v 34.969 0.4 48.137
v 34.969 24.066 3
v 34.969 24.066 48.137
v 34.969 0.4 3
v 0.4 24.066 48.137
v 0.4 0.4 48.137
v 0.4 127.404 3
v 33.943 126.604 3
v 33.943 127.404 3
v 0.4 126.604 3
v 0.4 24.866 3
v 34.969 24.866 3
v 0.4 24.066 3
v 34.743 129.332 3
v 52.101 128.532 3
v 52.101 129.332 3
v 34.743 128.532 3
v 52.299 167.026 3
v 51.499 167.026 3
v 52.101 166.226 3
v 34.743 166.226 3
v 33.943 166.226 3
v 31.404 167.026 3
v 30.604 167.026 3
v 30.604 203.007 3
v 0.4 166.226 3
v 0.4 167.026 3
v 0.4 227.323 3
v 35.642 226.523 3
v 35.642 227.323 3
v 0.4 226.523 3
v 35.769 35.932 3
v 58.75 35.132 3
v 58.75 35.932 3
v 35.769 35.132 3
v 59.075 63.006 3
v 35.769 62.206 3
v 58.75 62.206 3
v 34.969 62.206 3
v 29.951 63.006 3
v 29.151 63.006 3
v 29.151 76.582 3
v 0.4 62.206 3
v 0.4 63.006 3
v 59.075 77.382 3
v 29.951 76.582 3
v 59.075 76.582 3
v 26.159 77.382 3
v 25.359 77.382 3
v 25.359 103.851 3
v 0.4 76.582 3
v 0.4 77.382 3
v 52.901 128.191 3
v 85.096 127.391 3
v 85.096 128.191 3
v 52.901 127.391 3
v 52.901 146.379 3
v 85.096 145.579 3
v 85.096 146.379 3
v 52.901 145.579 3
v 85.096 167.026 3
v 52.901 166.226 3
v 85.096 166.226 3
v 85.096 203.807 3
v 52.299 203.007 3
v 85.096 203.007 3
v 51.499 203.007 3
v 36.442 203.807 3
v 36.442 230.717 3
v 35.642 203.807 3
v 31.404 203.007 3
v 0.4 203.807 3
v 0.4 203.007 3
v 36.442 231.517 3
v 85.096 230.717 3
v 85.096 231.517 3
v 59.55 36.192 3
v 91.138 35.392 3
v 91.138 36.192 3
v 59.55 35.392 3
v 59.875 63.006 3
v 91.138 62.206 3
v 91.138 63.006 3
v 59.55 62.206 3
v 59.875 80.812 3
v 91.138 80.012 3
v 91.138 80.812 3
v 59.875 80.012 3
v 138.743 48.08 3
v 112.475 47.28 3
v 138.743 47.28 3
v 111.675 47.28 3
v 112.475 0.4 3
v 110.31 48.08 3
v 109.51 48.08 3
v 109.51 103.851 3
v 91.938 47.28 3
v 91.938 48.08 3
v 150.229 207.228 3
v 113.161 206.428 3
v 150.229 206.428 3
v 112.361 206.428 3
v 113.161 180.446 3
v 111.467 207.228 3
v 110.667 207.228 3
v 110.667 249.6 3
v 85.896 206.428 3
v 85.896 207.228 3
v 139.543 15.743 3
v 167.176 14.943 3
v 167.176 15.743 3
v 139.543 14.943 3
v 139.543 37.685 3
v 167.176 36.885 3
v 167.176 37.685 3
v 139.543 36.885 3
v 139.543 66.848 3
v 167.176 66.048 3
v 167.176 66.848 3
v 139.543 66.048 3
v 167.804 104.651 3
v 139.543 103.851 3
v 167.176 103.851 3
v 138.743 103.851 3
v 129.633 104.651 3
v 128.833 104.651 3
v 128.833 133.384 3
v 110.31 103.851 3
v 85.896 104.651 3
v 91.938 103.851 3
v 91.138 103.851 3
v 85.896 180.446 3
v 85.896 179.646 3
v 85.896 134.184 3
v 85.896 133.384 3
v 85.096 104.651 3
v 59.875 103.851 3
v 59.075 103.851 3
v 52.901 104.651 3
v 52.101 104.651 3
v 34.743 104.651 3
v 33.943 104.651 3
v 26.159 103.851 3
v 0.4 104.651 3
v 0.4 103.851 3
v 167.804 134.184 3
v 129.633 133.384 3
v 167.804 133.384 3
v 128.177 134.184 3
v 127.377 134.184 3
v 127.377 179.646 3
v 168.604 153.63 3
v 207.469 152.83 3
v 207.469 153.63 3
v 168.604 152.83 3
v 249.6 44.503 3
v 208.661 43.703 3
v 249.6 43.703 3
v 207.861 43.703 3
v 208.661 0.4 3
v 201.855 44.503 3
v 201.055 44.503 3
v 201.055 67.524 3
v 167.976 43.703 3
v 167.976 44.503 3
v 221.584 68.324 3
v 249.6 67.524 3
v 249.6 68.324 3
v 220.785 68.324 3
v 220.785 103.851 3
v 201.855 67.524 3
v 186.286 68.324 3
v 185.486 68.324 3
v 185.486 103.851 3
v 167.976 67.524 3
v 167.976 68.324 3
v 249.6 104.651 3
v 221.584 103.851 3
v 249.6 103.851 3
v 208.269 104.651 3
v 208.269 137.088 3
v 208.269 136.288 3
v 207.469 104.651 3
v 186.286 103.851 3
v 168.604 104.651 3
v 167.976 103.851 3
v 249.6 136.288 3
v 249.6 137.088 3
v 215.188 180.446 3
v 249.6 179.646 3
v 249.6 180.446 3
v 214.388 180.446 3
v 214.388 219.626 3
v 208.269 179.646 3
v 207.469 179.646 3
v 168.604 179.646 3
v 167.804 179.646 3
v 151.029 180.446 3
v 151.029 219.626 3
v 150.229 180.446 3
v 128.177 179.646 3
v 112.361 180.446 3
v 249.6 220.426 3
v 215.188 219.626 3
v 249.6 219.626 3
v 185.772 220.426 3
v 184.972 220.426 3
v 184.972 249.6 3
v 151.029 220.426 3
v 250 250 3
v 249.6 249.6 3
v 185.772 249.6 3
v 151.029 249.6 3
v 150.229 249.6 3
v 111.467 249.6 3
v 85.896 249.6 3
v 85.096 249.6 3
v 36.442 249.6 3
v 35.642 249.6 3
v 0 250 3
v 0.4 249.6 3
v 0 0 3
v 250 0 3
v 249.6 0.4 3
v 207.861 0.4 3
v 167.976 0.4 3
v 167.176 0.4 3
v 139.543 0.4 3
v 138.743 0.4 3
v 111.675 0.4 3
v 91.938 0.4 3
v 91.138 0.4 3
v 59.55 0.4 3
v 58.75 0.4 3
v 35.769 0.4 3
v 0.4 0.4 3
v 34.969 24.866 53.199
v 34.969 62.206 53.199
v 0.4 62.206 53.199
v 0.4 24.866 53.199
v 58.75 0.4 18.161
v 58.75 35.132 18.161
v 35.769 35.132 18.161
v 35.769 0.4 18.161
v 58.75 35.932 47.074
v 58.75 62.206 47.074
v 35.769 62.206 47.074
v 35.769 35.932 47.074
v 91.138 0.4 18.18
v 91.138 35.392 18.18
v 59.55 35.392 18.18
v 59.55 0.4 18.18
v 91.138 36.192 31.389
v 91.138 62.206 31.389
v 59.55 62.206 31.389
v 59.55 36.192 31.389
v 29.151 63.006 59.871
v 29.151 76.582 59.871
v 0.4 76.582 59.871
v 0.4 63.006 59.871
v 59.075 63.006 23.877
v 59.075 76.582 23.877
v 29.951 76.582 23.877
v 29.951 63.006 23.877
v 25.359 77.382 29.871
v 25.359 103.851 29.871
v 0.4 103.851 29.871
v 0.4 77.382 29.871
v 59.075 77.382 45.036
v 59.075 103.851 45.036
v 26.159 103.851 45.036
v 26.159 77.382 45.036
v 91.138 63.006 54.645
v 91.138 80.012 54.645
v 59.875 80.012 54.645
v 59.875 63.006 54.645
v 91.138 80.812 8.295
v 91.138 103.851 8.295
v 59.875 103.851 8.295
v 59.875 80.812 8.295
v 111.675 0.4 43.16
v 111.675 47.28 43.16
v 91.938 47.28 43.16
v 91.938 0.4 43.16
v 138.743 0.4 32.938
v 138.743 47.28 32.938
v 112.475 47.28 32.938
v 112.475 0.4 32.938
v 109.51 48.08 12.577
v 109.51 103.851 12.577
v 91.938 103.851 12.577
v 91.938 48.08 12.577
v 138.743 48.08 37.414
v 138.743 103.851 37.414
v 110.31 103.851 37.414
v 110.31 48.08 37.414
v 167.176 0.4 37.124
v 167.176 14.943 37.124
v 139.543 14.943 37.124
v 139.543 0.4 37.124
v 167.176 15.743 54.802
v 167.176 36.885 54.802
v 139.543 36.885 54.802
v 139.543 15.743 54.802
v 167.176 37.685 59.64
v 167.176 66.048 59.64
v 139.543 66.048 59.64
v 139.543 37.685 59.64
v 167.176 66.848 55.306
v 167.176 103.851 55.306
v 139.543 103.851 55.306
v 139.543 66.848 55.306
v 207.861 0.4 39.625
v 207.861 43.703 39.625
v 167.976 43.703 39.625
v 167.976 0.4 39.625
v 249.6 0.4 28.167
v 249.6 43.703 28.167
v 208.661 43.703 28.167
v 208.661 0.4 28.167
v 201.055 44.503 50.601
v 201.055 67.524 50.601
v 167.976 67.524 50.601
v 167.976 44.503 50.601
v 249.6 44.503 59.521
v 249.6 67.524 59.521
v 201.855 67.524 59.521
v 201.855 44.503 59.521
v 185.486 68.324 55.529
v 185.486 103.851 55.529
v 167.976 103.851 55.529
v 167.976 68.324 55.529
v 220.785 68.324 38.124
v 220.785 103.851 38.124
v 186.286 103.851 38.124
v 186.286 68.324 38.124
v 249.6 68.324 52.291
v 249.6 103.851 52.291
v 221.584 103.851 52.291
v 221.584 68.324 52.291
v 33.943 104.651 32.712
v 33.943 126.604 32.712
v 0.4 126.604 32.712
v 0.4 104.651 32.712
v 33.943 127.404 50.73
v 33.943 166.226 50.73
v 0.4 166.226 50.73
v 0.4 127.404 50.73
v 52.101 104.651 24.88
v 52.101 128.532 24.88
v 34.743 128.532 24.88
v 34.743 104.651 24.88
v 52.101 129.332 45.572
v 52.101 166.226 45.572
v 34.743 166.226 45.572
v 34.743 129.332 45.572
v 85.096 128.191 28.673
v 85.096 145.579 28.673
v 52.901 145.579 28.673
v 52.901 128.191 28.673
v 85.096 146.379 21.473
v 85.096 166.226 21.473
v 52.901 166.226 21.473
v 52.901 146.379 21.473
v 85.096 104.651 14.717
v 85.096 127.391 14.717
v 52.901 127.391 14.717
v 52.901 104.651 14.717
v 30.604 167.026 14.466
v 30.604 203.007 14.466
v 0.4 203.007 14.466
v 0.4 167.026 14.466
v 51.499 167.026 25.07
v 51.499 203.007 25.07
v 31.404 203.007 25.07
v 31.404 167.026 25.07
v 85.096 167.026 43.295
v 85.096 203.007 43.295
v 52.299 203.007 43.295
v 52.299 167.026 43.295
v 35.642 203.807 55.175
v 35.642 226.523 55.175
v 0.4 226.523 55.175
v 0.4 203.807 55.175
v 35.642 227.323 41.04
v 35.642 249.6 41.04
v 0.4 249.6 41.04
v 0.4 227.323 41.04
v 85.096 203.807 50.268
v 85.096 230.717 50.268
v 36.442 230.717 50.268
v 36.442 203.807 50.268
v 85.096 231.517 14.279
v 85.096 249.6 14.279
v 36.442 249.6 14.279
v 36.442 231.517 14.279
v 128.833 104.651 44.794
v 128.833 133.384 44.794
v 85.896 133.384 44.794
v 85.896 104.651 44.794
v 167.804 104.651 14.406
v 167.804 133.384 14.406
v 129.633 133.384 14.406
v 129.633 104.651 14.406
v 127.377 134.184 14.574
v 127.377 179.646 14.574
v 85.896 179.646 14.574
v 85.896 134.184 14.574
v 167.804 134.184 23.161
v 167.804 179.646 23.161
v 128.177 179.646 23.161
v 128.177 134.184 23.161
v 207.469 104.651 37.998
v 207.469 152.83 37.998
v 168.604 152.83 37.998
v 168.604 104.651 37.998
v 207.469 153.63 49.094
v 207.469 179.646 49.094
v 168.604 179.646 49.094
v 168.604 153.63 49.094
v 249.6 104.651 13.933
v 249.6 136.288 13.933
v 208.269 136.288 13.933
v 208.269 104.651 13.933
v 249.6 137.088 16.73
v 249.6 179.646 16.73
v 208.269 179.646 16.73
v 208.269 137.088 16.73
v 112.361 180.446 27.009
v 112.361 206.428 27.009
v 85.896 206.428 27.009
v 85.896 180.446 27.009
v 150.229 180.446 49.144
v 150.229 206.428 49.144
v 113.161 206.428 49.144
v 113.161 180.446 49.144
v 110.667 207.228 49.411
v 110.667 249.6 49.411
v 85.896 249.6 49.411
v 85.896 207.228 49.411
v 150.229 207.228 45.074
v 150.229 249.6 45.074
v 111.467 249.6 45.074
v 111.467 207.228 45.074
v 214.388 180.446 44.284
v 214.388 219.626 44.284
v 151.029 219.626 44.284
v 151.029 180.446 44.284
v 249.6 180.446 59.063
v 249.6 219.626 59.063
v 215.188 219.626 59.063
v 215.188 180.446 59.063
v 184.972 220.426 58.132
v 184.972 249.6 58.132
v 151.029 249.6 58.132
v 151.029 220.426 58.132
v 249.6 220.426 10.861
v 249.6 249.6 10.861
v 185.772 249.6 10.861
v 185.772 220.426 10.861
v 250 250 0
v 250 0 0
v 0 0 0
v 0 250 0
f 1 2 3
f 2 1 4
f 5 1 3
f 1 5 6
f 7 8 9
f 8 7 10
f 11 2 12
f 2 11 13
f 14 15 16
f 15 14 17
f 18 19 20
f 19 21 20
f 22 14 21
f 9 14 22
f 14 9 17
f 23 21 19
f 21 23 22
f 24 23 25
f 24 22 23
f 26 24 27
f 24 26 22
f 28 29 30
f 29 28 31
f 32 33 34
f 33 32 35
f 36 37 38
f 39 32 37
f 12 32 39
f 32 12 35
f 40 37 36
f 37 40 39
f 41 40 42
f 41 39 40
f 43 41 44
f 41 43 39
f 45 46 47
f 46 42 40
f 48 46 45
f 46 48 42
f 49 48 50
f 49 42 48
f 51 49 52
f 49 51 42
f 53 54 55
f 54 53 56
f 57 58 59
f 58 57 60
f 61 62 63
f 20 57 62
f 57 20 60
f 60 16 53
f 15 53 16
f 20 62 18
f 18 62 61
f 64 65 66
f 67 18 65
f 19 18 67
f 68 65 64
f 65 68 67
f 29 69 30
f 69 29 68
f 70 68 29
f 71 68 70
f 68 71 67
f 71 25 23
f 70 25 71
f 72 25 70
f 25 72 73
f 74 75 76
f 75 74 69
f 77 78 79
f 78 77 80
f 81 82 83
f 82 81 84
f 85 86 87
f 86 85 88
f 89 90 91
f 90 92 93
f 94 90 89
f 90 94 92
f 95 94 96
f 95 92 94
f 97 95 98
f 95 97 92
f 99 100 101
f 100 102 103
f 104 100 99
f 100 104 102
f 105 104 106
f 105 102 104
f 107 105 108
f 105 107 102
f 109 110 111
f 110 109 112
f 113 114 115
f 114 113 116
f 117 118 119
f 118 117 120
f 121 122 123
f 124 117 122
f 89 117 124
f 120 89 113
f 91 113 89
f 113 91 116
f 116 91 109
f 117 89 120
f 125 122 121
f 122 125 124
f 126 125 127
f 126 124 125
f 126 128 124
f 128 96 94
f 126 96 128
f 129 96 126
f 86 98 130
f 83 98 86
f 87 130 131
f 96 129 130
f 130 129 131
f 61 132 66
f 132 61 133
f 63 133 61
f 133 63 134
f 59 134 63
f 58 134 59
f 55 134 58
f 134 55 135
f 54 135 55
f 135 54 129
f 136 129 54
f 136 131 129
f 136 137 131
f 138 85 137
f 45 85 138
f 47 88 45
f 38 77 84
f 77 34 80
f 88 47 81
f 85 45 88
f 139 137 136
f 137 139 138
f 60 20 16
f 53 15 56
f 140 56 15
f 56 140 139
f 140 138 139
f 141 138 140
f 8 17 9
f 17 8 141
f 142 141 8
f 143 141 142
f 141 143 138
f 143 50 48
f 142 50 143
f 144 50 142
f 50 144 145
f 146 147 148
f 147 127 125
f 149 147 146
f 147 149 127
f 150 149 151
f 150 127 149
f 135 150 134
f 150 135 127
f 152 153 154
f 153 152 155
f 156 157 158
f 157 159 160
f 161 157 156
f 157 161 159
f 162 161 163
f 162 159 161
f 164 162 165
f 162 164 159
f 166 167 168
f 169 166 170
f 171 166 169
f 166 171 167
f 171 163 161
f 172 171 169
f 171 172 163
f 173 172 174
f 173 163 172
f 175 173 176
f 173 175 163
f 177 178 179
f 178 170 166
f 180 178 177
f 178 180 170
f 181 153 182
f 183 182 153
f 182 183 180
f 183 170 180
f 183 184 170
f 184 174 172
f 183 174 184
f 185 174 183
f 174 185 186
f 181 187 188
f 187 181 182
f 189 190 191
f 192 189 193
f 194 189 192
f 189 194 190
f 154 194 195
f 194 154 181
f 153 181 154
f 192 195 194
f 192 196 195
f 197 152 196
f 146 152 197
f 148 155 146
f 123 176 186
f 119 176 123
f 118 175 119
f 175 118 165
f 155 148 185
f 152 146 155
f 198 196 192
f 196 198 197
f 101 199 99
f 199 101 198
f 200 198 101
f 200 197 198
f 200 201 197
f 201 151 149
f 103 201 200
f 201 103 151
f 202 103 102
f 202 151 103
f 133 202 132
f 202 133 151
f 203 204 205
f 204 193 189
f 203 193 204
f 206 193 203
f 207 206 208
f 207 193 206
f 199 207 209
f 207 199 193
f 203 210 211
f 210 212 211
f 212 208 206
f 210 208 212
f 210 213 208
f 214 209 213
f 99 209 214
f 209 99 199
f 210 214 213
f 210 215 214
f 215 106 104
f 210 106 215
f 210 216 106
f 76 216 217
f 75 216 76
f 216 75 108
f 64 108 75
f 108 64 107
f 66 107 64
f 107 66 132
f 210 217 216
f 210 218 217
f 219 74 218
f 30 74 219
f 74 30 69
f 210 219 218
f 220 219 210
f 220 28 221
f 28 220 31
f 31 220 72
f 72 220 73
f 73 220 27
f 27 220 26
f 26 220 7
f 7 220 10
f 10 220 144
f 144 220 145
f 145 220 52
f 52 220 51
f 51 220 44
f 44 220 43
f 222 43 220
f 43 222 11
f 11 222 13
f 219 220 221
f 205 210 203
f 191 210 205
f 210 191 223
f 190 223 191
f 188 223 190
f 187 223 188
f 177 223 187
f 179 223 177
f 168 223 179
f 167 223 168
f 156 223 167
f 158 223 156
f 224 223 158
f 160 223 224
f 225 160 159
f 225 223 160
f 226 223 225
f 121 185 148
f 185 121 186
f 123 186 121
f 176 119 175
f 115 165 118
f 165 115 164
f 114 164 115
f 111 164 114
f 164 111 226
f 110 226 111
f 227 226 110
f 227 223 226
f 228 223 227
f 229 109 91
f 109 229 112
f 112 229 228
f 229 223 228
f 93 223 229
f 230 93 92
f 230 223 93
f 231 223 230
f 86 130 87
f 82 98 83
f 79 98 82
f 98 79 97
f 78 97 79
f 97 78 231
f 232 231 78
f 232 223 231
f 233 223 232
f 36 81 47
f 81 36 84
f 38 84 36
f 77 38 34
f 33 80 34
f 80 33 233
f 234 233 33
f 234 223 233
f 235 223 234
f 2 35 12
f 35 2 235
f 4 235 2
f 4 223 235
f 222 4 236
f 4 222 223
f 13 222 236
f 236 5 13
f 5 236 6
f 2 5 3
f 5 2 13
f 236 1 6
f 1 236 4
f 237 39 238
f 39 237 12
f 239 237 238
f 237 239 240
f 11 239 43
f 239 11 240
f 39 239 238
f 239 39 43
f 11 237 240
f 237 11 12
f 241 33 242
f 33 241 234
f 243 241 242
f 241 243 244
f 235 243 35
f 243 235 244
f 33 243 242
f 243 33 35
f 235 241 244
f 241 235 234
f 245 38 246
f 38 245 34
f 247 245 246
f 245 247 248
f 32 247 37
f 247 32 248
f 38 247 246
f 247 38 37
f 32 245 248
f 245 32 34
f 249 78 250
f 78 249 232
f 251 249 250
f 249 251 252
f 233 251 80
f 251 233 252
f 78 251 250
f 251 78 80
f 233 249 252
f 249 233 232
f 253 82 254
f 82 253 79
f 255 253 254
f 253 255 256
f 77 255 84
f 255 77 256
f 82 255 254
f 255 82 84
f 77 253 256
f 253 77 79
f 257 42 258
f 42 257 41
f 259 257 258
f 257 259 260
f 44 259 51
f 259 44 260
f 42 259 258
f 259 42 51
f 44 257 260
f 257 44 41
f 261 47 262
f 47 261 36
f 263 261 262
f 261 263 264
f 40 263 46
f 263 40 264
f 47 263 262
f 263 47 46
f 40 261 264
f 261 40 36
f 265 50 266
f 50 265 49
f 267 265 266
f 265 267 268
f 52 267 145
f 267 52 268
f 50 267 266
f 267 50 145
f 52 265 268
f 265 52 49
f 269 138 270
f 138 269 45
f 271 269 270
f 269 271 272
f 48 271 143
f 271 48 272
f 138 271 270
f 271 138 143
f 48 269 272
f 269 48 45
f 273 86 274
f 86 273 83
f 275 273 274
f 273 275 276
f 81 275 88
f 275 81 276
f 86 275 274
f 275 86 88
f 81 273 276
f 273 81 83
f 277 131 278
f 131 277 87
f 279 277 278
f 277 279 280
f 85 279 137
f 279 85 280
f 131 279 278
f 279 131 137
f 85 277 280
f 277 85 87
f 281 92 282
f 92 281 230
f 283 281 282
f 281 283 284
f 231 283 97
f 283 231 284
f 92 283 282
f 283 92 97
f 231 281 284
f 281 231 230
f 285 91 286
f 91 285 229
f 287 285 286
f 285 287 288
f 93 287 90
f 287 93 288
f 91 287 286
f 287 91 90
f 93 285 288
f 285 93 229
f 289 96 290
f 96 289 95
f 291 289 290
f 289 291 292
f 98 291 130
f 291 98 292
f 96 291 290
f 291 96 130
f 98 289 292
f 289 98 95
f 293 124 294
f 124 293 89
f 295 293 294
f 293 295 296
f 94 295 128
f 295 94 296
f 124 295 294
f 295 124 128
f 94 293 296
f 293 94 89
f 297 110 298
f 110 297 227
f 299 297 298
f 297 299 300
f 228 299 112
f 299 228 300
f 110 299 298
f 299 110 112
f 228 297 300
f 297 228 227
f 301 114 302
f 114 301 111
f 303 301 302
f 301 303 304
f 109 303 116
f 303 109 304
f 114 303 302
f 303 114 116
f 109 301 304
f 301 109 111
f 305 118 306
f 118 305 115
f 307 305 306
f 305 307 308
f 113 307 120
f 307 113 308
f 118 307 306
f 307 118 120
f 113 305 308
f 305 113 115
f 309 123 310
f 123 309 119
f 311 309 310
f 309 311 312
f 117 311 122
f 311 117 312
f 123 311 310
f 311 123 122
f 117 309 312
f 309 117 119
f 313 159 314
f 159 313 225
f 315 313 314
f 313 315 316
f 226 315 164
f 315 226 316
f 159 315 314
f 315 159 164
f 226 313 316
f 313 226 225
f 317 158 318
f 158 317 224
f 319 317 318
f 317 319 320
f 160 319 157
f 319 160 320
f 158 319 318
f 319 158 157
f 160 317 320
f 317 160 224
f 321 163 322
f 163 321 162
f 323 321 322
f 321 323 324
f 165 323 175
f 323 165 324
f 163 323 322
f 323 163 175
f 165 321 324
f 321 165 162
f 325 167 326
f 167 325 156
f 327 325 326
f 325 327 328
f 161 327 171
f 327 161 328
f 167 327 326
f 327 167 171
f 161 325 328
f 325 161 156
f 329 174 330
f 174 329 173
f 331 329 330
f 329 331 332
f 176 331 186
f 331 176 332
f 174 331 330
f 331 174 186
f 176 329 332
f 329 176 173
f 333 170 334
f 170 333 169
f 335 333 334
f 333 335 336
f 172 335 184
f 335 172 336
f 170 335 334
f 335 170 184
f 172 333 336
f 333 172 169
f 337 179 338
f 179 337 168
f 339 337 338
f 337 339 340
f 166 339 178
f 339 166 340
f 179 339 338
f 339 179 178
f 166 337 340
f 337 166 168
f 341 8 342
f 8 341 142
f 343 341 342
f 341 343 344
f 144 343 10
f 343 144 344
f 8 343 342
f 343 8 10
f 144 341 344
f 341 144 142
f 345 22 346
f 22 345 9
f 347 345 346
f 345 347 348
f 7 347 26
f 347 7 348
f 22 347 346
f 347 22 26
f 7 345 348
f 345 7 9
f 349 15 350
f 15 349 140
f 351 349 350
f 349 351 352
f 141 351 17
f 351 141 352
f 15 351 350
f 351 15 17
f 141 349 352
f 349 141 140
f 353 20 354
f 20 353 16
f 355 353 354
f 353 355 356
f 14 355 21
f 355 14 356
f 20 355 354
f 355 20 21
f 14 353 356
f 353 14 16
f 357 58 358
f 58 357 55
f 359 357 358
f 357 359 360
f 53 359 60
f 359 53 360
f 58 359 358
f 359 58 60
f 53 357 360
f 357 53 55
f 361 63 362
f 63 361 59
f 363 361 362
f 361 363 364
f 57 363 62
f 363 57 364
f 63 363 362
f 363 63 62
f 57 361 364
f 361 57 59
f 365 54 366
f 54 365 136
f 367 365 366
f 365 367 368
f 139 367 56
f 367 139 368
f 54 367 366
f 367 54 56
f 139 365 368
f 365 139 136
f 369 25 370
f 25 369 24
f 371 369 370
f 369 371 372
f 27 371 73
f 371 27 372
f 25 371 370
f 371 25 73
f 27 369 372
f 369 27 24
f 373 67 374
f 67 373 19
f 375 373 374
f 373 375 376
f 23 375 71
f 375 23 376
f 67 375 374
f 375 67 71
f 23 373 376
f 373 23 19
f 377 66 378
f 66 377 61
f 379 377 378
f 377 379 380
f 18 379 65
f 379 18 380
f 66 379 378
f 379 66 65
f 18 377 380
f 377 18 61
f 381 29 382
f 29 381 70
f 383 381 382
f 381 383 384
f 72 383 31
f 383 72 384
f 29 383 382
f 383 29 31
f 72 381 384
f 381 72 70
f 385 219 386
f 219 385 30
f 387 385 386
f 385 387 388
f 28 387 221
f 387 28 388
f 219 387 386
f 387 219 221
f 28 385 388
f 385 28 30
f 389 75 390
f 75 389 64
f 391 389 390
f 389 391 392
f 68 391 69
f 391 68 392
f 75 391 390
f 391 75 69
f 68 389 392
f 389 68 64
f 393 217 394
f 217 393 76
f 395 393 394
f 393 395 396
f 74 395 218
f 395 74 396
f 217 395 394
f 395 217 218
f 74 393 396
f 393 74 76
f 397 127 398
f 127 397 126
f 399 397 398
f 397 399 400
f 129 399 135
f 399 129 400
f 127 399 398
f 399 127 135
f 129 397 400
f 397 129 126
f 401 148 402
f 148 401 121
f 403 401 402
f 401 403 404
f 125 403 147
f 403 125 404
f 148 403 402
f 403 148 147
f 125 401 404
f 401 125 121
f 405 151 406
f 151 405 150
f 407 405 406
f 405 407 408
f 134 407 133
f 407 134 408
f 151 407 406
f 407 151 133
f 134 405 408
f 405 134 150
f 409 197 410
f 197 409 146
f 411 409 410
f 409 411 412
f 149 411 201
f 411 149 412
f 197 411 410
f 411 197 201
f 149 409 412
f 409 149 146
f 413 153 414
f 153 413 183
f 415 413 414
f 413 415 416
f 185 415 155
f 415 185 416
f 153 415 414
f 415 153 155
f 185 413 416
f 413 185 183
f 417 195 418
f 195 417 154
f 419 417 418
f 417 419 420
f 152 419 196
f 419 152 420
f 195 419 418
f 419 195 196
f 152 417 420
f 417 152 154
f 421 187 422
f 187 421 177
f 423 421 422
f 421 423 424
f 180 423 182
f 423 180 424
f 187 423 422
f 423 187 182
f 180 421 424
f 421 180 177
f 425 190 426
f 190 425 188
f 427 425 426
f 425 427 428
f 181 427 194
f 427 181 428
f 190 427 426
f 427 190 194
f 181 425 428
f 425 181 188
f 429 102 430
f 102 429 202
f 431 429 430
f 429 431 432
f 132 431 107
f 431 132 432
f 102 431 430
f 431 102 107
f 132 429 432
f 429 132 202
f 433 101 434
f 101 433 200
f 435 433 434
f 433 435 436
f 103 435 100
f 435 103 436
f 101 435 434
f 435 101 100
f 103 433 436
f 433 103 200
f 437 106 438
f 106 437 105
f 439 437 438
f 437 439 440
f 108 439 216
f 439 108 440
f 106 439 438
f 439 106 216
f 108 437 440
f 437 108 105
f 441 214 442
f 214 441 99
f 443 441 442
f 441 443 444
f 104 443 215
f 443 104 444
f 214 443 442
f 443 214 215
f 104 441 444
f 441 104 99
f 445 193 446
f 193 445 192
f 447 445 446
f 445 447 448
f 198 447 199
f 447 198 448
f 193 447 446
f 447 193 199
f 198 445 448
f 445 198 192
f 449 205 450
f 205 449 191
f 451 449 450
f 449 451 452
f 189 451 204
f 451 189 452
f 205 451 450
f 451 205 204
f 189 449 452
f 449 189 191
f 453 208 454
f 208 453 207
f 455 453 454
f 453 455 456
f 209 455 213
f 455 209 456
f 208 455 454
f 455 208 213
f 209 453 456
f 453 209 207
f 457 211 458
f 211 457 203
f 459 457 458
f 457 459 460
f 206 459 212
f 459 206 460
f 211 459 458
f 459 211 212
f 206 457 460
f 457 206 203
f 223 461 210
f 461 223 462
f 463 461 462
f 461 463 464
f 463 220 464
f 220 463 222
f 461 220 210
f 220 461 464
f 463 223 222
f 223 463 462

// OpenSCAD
// ============================================================
//  FRAKTAL-AKUSTIK-KACHEL   250 × 250 × 60 mm
//  Schallabsorption + Diffusion durch BSP-Fraktalstruktur
//
//  Material:  PLA / PETG
//  Infill:    12–15 % Gyroid
//  Schicht:   0.2 mm empfohlen
//
//  Rendern:   F6 in OpenSCAD (dauert ~30–90 s bei depth=6)
//  Export:    Datei → Als STL exportieren
// ============================================================

// ─── Parameter ───────────────────────────────────────────────

tile_size  = 250;  // mm  Kantenlänge (quadratisch)
base_thick =   3;  // mm  Rückwandstärke (zum Aufkleben/Aufhängen)
h_max      =  57;  // mm  Maximale Säulenhöhe über Rückwand  → Gesamt: 60 mm
h_min      =   5;  // mm  Minimale Säulenhöhe
gap        = 0.8;  // mm  Schlitz zwischen Zellen (Schallschlitze; 0 = kein Spalt)
max_depth  =   6;  // BSP-Rekursionstiefe  (5 = schnell, 7 = fein)
min_cell   =  18;  // mm  Kleinste erlaubte Zellgröße

// ─── Deterministisch-zufällige Hilfsfunktionen ───────────────
//     rands(min, max, count, seed) → gleicher seed = gleiche Form

// Höhe der Blattzelle
function leaf_h(id) =
    h_min + rands(0, 1, 1, id)[0] * (h_max - h_min);

// Splitverhältnis: 33 % – 67 %  (verhindert extrem schmale Zellen)
function split_r(id) =
    0.33 + rands(0, 1, 1, id + 100000)[0] * 0.34;

// Splitrichtung bei ausgeglichenem Seitenverhältnis (0 = X, 1 = Y)
function split_d(id) =
    rands(0, 1, 1, id + 200000)[0] > 0.5 ? 0 : 1;

// ─── Rekursives BSP-Modul ────────────────────────────────────

module bsp(x, y, w, h, lvl, id) {
    ok_x = (w >= min_cell * 2 + gap);
    ok_y = (h >= min_cell * 2 + gap);

    if (lvl >= max_depth || (!ok_x && !ok_y)) {
        // Blattzelle → Quader mit pseudo-zufälliger Höhe
        translate([x + gap/2, y + gap/2, base_thick])
            cube([w - gap, h - gap, leaf_h(id)]);

    } else {
        // Splitrichtung: Seitenverhältnis hat Vorrang, sonst zufällig
        dir = (!ok_y)       ? 0 :          // nur X-Split möglich
              (!ok_x)       ? 1 :          // nur Y-Split möglich
              (w > h * 1.5) ? 0 :          // deutlich breiter → X teilen
              (h > w * 1.5) ? 1 :          // deutlich höher   → Y teilen
              split_d(id);                 // ähnlich → zufällig

        if (dir == 0) {
            sw = w * split_r(id);
            bsp(x,    y, sw,   h, lvl + 1, id * 2    );
            bsp(x+sw, y, w-sw, h, lvl + 1, id * 2 + 1);
        } else {
            sh = h * split_r(id);
            bsp(x, y,    w, sh,   lvl + 1, id * 2    );
            bsp(x, y+sh, w, h-sh, lvl + 1, id * 2 + 1);
        }
    }
}

// ─── Hauptobjekt ─────────────────────────────────────────────

union() {
    // Flache Rückwand
    cube([tile_size, tile_size, base_thick]);

    // Fraktales Diffusor-Muster (BSP, 6 Ebenen)
    bsp(0, 0, tile_size, tile_size, 0, 1);
}
